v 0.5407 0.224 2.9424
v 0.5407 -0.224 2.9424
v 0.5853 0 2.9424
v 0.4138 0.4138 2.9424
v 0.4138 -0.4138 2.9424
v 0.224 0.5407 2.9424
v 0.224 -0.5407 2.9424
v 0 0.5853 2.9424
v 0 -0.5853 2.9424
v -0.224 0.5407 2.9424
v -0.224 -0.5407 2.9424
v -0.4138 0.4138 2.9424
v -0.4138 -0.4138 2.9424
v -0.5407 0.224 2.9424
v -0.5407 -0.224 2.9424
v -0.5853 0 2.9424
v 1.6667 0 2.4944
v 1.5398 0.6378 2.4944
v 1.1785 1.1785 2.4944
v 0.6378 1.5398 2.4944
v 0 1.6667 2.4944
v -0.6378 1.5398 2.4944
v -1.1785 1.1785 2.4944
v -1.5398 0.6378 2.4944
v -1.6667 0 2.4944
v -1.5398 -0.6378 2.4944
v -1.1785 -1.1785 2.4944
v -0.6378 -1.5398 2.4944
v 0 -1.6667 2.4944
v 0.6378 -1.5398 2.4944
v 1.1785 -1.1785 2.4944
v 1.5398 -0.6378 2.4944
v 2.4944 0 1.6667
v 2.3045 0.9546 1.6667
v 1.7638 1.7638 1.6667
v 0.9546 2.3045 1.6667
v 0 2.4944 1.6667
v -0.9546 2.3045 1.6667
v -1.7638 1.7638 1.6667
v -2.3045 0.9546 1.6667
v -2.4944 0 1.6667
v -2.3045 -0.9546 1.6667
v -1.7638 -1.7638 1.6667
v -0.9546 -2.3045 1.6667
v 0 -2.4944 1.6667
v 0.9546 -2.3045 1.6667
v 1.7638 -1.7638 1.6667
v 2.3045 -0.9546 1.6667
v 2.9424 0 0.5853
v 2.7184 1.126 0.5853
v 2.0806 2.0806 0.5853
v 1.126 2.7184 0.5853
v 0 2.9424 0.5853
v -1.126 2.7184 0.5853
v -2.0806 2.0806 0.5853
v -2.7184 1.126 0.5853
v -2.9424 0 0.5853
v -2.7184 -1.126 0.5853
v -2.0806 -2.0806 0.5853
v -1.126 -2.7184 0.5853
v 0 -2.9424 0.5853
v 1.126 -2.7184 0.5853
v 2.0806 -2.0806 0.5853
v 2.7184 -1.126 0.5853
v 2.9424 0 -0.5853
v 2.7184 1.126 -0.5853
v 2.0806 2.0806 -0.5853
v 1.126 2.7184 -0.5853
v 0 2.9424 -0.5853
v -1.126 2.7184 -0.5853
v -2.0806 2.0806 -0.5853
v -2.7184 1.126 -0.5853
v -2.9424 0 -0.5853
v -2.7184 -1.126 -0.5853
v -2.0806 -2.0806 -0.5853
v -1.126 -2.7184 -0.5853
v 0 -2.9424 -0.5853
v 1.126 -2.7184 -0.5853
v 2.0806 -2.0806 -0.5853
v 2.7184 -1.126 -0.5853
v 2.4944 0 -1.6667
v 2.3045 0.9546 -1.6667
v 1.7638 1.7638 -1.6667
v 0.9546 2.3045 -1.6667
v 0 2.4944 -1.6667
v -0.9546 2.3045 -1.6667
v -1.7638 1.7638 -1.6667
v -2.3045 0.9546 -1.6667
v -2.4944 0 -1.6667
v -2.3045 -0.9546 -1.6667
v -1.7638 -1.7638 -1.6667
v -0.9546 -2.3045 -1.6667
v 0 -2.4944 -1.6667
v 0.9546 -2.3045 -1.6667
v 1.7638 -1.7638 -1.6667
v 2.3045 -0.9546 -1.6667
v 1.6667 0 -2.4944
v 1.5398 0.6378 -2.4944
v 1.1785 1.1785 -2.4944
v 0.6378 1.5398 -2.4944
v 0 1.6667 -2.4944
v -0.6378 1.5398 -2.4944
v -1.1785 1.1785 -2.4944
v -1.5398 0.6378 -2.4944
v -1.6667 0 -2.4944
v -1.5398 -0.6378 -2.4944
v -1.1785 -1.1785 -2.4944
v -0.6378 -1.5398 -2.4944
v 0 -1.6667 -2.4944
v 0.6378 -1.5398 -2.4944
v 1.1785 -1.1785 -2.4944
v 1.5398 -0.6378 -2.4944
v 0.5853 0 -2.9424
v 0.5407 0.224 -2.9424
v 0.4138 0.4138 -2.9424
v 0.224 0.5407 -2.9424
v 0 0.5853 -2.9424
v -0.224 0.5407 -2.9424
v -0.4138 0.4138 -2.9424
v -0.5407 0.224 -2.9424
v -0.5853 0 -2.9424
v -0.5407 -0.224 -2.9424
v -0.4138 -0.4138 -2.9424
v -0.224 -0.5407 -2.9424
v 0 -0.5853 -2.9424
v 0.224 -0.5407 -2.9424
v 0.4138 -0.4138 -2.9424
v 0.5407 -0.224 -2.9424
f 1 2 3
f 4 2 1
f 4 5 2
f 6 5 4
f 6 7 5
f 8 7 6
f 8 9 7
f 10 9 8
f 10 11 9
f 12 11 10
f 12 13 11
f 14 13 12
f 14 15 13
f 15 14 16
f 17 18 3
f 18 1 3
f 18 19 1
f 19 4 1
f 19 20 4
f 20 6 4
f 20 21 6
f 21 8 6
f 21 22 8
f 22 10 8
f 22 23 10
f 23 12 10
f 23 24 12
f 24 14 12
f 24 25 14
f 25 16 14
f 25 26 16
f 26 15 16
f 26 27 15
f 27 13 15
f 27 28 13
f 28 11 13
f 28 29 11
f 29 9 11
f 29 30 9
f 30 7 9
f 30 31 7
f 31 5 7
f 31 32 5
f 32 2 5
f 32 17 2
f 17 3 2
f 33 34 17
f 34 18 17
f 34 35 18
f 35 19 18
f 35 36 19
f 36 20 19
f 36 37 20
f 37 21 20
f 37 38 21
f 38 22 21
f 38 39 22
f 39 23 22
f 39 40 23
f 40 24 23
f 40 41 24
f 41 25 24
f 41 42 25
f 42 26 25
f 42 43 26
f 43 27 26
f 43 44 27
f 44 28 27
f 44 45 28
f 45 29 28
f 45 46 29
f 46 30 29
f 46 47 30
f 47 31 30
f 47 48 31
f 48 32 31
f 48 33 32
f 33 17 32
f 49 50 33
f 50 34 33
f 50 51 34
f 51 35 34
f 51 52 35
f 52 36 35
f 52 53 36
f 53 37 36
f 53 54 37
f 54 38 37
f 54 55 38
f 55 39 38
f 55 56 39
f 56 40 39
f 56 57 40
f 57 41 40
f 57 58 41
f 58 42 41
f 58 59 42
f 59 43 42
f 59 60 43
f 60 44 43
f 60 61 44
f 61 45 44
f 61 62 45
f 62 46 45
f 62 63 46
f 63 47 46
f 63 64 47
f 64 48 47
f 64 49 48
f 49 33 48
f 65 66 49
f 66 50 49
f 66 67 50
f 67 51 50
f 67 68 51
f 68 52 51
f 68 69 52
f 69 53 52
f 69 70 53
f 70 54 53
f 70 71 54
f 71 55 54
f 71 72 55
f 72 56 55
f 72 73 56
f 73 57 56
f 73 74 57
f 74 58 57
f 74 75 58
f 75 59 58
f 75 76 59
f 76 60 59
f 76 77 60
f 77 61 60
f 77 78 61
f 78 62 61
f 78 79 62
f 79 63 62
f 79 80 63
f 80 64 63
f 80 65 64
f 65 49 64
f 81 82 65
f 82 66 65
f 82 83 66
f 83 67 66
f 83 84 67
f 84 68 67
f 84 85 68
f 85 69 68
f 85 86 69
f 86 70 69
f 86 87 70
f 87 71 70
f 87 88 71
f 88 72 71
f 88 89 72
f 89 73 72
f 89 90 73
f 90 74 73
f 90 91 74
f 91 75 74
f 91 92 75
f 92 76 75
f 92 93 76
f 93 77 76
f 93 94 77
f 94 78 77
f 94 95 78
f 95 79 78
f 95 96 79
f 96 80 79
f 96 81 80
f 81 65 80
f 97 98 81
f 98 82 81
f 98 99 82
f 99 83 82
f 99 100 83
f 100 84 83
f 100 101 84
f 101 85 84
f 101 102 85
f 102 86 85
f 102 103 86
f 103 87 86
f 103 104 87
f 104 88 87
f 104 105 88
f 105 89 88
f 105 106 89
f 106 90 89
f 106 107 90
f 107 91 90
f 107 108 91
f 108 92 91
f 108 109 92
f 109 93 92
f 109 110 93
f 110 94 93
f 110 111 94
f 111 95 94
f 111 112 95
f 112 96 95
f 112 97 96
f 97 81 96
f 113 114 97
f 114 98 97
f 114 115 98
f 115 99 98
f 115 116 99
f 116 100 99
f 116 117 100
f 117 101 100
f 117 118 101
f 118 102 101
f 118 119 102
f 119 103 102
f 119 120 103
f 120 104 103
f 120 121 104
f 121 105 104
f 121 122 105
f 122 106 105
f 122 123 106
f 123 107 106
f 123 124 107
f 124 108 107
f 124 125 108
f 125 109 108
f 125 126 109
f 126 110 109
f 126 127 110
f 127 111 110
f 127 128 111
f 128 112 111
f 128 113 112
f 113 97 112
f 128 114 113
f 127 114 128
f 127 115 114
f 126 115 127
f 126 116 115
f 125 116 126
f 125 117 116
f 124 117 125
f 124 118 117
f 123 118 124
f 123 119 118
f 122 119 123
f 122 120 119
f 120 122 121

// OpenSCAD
// file: mylib/sub/deep.scad
// Deeply nested file (3 levels from main)
module deep_shape() {
    sphere(r = 3, $fn = 16);
}
// file: mylib/entry.scad
// Entry point for deep nesting test — includes a subdirectory file
include <sub/deep.scad>
// main file
// Test: 3-level deep nested includes.
// main -> mylib/entry.scad -> mylib/sub/deep.scad
include <mylib/entry.scad>

// Use a module defined in deep.scad (included transitively via entry.scad)
deep_shape();
